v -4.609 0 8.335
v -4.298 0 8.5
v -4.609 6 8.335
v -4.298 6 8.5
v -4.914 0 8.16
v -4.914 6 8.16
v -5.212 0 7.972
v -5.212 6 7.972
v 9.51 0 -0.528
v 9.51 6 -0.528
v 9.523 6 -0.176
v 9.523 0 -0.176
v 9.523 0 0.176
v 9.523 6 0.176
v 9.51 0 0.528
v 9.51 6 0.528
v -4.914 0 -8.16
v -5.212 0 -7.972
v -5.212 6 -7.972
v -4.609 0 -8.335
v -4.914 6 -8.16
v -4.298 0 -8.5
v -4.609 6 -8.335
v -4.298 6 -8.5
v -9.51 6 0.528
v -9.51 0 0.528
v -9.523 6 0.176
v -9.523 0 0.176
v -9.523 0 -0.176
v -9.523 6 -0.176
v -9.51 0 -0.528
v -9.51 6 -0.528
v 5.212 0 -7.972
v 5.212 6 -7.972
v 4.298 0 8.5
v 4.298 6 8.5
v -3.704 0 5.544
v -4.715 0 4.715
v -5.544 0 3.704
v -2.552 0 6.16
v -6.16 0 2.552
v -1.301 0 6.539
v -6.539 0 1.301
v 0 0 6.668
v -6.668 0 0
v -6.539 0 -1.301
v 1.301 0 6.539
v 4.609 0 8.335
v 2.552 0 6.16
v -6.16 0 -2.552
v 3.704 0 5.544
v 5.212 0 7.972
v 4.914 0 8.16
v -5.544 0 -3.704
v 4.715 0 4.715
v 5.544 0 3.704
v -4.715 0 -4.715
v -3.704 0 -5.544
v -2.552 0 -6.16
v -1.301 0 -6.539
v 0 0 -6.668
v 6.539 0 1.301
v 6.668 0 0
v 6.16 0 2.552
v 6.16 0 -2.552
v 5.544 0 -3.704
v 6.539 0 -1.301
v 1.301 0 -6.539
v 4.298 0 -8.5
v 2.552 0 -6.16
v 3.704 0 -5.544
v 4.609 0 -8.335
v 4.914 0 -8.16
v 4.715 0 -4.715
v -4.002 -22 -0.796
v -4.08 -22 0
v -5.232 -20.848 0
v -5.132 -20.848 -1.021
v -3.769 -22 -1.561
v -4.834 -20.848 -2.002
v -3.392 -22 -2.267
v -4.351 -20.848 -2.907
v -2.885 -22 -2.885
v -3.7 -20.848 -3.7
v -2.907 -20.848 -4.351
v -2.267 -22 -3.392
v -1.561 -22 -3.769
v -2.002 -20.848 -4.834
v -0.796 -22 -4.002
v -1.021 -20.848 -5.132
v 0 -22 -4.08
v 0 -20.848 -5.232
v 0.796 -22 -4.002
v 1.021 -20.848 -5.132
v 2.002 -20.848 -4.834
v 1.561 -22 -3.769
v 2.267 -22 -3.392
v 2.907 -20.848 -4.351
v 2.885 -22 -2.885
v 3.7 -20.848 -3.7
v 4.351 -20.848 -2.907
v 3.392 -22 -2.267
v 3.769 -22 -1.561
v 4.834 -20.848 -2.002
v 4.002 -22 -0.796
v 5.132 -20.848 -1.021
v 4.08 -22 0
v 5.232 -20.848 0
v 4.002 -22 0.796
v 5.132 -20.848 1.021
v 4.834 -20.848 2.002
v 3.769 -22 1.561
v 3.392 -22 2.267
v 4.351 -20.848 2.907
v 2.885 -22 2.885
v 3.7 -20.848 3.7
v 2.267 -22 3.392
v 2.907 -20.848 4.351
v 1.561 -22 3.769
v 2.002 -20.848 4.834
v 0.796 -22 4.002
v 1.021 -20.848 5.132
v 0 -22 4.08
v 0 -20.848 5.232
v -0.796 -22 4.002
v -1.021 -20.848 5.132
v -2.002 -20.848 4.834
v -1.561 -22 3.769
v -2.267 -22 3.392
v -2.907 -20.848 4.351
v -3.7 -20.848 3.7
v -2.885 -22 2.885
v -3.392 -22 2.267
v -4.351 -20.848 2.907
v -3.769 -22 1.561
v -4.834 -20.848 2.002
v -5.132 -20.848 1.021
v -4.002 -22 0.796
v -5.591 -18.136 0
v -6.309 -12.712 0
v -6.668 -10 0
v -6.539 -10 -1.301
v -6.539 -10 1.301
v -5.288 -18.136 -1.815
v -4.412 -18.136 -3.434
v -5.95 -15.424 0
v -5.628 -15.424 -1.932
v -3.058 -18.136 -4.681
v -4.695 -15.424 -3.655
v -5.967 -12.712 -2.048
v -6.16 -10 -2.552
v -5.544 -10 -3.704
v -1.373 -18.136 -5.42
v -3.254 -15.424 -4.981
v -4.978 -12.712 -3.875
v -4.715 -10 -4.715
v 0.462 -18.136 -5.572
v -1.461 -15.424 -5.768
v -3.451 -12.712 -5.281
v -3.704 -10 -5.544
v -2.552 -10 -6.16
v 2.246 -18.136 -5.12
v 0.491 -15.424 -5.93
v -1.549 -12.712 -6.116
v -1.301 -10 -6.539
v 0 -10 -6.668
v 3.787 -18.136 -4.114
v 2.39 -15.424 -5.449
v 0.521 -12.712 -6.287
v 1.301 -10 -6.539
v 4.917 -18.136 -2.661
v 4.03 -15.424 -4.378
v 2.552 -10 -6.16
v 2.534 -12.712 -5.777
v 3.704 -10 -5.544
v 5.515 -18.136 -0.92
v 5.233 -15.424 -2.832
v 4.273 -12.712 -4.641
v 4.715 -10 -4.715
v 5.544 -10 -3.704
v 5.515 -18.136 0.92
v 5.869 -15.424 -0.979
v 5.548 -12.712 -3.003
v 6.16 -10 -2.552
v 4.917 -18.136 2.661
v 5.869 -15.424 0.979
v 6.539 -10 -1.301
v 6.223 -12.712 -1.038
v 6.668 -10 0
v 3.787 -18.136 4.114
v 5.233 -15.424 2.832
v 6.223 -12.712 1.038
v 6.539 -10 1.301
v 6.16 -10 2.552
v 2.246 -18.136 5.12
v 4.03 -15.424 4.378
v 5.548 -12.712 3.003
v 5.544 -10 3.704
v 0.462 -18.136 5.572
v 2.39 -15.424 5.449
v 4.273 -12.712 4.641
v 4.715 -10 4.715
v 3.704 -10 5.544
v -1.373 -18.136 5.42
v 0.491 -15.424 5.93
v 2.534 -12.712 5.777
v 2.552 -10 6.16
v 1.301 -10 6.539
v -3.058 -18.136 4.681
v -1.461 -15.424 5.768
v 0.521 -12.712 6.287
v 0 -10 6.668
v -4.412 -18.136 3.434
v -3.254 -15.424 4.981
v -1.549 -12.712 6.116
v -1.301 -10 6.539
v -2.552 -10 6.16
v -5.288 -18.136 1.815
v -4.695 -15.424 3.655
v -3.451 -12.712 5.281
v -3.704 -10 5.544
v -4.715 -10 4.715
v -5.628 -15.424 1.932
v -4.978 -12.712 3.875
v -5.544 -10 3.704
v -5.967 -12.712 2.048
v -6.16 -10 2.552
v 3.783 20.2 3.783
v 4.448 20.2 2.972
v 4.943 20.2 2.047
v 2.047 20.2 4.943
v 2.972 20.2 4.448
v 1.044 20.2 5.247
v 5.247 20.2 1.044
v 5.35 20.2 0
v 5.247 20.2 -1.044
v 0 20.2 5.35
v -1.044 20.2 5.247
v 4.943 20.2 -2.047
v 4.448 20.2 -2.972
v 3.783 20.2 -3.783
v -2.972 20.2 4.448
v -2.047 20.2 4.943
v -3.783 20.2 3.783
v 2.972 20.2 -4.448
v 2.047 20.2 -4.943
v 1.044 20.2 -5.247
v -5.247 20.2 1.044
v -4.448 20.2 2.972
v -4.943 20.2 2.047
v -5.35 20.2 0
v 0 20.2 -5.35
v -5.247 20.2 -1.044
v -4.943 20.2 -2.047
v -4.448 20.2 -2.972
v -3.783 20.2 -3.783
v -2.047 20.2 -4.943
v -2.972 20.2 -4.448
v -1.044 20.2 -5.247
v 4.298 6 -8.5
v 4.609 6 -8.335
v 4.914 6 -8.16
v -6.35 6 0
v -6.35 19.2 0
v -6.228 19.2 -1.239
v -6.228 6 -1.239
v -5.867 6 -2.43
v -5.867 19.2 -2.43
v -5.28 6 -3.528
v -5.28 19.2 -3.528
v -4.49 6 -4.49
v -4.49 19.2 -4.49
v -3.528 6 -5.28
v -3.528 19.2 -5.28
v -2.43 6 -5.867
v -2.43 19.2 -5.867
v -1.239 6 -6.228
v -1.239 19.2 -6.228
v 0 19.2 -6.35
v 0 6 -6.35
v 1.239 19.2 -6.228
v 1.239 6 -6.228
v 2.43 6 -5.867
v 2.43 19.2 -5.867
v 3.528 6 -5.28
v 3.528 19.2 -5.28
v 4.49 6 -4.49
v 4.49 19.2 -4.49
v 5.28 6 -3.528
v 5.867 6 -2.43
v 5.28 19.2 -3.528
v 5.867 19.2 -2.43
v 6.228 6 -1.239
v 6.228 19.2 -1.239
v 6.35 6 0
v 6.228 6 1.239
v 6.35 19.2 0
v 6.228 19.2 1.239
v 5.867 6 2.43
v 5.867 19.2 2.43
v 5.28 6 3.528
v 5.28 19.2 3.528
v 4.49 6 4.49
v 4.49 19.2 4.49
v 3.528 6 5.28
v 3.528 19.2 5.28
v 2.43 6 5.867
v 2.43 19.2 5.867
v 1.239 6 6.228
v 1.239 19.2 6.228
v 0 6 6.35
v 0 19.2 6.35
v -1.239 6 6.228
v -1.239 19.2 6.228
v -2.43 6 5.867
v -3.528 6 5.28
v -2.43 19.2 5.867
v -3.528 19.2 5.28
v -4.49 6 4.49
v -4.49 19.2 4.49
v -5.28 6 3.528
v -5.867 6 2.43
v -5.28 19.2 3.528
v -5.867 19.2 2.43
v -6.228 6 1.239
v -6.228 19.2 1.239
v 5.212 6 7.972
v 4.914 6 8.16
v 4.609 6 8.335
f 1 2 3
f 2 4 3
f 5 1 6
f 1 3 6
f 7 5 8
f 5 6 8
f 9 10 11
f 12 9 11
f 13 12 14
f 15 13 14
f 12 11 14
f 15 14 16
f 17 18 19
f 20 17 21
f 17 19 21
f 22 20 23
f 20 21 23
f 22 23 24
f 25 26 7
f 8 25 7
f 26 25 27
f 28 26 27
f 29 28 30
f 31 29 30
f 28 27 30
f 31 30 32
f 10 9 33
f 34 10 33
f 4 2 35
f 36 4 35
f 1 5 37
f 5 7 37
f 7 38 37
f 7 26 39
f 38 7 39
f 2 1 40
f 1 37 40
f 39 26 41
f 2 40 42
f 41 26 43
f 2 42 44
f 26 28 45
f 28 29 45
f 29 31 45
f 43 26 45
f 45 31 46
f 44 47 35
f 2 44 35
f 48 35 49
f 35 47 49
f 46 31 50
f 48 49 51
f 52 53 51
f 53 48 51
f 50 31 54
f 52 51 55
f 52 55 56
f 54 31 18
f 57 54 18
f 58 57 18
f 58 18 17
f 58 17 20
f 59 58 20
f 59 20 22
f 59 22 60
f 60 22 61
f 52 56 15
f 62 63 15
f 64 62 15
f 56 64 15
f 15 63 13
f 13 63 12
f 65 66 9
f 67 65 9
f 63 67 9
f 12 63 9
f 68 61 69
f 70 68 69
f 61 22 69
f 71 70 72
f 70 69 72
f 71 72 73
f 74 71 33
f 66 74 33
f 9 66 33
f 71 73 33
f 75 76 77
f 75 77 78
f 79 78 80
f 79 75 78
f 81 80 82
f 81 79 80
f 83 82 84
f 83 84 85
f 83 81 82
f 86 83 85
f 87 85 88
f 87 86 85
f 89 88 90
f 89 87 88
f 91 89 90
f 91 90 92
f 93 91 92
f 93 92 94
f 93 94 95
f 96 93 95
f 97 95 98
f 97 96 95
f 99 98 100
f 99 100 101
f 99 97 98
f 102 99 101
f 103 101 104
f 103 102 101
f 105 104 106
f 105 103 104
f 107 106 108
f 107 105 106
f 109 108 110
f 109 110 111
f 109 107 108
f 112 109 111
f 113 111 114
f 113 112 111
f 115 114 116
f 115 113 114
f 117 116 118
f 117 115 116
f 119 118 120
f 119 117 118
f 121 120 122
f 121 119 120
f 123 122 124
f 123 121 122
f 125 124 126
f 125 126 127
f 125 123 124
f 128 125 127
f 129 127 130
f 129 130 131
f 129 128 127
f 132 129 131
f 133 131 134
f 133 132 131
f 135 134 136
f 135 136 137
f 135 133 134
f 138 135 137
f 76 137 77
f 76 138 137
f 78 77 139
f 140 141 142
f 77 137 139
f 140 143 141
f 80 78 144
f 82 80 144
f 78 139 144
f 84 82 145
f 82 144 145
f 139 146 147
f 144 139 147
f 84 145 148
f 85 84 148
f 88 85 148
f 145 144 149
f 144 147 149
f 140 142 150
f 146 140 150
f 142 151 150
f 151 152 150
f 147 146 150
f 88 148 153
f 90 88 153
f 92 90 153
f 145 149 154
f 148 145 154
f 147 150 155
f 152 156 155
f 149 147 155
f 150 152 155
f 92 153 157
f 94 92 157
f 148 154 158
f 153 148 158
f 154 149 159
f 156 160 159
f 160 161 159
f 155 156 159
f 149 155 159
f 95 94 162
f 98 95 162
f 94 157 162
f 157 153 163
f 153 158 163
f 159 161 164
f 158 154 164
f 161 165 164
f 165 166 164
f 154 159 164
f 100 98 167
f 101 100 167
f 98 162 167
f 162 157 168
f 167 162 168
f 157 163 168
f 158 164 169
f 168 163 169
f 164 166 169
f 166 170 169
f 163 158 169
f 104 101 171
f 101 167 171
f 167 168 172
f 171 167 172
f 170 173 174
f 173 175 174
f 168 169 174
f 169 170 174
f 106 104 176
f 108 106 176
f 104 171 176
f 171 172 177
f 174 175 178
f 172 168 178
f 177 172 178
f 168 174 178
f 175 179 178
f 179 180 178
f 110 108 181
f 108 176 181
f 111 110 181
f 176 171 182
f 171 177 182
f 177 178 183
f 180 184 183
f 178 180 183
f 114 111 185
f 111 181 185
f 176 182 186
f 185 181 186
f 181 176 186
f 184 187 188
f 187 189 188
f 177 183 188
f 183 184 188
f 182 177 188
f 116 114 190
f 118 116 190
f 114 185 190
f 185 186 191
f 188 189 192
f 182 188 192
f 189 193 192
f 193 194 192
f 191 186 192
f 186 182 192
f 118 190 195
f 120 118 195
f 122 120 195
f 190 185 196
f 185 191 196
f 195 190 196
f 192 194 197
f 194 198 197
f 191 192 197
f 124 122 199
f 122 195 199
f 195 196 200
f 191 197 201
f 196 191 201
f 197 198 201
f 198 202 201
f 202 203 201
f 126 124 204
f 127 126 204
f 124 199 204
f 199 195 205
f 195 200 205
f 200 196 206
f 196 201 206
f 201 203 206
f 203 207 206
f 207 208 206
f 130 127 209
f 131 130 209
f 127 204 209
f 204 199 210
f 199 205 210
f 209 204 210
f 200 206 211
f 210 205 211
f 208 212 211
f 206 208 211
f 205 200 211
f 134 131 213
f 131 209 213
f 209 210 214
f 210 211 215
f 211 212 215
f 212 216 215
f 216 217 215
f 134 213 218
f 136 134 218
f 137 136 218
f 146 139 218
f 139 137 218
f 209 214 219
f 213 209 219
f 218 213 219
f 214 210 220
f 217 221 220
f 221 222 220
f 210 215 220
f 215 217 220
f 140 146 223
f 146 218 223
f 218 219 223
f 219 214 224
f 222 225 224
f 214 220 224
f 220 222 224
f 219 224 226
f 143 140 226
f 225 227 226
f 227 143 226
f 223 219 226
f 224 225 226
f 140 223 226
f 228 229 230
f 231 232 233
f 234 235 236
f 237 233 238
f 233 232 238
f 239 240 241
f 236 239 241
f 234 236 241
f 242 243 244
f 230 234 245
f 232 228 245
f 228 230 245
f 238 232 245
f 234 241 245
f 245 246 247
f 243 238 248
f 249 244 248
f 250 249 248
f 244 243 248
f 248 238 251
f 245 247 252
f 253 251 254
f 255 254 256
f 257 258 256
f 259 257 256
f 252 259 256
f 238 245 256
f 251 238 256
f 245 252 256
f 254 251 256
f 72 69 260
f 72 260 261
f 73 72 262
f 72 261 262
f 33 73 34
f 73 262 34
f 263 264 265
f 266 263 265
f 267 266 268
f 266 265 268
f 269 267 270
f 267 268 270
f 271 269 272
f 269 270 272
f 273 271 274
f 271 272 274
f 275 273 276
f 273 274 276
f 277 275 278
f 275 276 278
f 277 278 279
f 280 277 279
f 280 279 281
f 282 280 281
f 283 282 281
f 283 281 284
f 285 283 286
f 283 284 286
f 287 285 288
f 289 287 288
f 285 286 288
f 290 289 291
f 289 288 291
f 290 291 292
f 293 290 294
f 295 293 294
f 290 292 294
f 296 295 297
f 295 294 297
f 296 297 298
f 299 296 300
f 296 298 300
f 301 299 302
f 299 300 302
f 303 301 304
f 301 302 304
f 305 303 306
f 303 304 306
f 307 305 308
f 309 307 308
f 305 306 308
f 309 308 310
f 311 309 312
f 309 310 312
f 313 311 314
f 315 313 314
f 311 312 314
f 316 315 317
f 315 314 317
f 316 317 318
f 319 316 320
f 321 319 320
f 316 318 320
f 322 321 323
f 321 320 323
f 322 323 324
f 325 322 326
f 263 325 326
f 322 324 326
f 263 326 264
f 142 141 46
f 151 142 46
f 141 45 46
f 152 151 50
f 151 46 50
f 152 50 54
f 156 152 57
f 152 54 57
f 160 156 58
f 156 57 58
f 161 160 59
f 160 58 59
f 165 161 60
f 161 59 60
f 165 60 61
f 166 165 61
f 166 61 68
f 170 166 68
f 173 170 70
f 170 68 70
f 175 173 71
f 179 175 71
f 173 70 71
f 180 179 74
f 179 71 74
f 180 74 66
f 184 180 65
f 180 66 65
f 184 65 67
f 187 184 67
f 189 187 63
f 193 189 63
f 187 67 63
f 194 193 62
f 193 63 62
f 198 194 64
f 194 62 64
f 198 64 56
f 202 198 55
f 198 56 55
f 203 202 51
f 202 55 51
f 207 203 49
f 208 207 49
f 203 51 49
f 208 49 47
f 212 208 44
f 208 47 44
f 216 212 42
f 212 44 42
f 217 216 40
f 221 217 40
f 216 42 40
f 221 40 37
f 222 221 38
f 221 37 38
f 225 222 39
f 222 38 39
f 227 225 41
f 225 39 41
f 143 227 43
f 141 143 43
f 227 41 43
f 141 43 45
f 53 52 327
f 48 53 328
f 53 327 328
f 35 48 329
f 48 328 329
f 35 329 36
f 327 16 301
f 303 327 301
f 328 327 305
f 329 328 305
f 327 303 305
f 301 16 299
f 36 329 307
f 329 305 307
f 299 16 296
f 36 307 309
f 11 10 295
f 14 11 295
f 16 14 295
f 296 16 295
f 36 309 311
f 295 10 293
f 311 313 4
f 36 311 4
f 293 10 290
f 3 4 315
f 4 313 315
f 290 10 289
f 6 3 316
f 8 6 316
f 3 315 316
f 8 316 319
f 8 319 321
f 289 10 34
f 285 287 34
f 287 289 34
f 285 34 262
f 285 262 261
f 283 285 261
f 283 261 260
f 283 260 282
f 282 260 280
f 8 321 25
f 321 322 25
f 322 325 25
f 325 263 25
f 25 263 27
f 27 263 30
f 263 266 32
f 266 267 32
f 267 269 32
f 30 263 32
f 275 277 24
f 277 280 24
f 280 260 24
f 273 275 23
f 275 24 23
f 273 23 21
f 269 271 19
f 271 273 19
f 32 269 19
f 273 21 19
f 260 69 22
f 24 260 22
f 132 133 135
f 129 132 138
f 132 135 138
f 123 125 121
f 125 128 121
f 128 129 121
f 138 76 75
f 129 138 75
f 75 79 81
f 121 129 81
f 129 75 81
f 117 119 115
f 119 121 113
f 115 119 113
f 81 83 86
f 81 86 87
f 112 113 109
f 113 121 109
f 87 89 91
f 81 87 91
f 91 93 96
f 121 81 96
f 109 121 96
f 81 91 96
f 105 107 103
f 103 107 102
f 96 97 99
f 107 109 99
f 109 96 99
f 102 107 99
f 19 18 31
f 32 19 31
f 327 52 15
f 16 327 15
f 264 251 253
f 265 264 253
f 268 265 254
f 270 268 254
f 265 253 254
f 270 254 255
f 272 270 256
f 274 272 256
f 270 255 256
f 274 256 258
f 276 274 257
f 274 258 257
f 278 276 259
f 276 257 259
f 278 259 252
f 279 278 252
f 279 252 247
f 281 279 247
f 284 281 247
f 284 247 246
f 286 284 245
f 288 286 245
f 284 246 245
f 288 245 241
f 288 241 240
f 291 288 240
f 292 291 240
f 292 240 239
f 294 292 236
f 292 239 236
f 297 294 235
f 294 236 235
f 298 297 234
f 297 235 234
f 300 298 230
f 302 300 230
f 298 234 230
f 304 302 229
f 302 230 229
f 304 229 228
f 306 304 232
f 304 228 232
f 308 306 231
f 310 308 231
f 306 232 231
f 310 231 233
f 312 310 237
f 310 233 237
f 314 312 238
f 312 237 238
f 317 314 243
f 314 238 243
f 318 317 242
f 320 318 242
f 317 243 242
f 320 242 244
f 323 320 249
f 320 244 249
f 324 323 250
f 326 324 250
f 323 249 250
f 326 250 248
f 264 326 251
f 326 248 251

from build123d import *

# Parameters (mm, degrees)
CHAMFER1_SIZE         = 1
CHAMFER1_EDGE_2_SIZE2 = 1
CHAMFER1_EDGE_2_SIZE  = 1.162501902
SKETCH4_OUTSIDE_W     = 31.064
SKETCH4_OUTSIDE_H     = 31.064
CUT_EXTRUDE3_DEPTH    = 21.2


with BuildPart() as part:
    # Sketch1 → Revolve1 (revolve)
    with BuildSketch(Plane.XY):
        Polygon((-6.6675, 0), (-9.525, 0), (-9.525, 6), (-6.35, 6), (-6.35, 20.2), (0, 20.2), (0, -22), (-5.08, -22), (-6.6675, -10), align=None)
    revolve(axis=Axis((0, 72.046513776, 0), (0, -1, 0)))

    # Chamfer1
    chamfer1_edges = [part.edges().sort_by_distance(p)[0] for p in [
        (6.35, 20.2, 0),
    ]]
    chamfer(chamfer1_edges, length=CHAMFER1_SIZE)

    # Chamfer1 edge 2
    chamfer1_edge_2_edges = [part.edges().sort_by_distance(p)[0] for p in [
        (5.08, -22, 0),
    ]]
    chamfer(chamfer1_edge_2_edges, length=CHAMFER1_EDGE_2_SIZE, length2=CHAMFER1_EDGE_2_SIZE2)

    # Sketch4 outside → Cut-Extrude3 (cut, through all)
    with BuildSketch(Plane(origin=(0, 0, 0), x_dir=(1, 0, 0), z_dir=(0, 1, 0))):
        Rectangle(SKETCH4_OUTSIDE_W, SKETCH4_OUTSIDE_H)
        Polygon((9.814954576, 0), (4.907477288, 8.5), (-4.907477288, 8.5), (-9.814954576, 0), (-4.907477288, -8.5), (4.907477288, -8.5), align=None, mode=Mode.SUBTRACT)
    extrude(amount=CUT_EXTRUDE3_DEPTH, mode=Mode.SUBTRACT)


solid = part.part
